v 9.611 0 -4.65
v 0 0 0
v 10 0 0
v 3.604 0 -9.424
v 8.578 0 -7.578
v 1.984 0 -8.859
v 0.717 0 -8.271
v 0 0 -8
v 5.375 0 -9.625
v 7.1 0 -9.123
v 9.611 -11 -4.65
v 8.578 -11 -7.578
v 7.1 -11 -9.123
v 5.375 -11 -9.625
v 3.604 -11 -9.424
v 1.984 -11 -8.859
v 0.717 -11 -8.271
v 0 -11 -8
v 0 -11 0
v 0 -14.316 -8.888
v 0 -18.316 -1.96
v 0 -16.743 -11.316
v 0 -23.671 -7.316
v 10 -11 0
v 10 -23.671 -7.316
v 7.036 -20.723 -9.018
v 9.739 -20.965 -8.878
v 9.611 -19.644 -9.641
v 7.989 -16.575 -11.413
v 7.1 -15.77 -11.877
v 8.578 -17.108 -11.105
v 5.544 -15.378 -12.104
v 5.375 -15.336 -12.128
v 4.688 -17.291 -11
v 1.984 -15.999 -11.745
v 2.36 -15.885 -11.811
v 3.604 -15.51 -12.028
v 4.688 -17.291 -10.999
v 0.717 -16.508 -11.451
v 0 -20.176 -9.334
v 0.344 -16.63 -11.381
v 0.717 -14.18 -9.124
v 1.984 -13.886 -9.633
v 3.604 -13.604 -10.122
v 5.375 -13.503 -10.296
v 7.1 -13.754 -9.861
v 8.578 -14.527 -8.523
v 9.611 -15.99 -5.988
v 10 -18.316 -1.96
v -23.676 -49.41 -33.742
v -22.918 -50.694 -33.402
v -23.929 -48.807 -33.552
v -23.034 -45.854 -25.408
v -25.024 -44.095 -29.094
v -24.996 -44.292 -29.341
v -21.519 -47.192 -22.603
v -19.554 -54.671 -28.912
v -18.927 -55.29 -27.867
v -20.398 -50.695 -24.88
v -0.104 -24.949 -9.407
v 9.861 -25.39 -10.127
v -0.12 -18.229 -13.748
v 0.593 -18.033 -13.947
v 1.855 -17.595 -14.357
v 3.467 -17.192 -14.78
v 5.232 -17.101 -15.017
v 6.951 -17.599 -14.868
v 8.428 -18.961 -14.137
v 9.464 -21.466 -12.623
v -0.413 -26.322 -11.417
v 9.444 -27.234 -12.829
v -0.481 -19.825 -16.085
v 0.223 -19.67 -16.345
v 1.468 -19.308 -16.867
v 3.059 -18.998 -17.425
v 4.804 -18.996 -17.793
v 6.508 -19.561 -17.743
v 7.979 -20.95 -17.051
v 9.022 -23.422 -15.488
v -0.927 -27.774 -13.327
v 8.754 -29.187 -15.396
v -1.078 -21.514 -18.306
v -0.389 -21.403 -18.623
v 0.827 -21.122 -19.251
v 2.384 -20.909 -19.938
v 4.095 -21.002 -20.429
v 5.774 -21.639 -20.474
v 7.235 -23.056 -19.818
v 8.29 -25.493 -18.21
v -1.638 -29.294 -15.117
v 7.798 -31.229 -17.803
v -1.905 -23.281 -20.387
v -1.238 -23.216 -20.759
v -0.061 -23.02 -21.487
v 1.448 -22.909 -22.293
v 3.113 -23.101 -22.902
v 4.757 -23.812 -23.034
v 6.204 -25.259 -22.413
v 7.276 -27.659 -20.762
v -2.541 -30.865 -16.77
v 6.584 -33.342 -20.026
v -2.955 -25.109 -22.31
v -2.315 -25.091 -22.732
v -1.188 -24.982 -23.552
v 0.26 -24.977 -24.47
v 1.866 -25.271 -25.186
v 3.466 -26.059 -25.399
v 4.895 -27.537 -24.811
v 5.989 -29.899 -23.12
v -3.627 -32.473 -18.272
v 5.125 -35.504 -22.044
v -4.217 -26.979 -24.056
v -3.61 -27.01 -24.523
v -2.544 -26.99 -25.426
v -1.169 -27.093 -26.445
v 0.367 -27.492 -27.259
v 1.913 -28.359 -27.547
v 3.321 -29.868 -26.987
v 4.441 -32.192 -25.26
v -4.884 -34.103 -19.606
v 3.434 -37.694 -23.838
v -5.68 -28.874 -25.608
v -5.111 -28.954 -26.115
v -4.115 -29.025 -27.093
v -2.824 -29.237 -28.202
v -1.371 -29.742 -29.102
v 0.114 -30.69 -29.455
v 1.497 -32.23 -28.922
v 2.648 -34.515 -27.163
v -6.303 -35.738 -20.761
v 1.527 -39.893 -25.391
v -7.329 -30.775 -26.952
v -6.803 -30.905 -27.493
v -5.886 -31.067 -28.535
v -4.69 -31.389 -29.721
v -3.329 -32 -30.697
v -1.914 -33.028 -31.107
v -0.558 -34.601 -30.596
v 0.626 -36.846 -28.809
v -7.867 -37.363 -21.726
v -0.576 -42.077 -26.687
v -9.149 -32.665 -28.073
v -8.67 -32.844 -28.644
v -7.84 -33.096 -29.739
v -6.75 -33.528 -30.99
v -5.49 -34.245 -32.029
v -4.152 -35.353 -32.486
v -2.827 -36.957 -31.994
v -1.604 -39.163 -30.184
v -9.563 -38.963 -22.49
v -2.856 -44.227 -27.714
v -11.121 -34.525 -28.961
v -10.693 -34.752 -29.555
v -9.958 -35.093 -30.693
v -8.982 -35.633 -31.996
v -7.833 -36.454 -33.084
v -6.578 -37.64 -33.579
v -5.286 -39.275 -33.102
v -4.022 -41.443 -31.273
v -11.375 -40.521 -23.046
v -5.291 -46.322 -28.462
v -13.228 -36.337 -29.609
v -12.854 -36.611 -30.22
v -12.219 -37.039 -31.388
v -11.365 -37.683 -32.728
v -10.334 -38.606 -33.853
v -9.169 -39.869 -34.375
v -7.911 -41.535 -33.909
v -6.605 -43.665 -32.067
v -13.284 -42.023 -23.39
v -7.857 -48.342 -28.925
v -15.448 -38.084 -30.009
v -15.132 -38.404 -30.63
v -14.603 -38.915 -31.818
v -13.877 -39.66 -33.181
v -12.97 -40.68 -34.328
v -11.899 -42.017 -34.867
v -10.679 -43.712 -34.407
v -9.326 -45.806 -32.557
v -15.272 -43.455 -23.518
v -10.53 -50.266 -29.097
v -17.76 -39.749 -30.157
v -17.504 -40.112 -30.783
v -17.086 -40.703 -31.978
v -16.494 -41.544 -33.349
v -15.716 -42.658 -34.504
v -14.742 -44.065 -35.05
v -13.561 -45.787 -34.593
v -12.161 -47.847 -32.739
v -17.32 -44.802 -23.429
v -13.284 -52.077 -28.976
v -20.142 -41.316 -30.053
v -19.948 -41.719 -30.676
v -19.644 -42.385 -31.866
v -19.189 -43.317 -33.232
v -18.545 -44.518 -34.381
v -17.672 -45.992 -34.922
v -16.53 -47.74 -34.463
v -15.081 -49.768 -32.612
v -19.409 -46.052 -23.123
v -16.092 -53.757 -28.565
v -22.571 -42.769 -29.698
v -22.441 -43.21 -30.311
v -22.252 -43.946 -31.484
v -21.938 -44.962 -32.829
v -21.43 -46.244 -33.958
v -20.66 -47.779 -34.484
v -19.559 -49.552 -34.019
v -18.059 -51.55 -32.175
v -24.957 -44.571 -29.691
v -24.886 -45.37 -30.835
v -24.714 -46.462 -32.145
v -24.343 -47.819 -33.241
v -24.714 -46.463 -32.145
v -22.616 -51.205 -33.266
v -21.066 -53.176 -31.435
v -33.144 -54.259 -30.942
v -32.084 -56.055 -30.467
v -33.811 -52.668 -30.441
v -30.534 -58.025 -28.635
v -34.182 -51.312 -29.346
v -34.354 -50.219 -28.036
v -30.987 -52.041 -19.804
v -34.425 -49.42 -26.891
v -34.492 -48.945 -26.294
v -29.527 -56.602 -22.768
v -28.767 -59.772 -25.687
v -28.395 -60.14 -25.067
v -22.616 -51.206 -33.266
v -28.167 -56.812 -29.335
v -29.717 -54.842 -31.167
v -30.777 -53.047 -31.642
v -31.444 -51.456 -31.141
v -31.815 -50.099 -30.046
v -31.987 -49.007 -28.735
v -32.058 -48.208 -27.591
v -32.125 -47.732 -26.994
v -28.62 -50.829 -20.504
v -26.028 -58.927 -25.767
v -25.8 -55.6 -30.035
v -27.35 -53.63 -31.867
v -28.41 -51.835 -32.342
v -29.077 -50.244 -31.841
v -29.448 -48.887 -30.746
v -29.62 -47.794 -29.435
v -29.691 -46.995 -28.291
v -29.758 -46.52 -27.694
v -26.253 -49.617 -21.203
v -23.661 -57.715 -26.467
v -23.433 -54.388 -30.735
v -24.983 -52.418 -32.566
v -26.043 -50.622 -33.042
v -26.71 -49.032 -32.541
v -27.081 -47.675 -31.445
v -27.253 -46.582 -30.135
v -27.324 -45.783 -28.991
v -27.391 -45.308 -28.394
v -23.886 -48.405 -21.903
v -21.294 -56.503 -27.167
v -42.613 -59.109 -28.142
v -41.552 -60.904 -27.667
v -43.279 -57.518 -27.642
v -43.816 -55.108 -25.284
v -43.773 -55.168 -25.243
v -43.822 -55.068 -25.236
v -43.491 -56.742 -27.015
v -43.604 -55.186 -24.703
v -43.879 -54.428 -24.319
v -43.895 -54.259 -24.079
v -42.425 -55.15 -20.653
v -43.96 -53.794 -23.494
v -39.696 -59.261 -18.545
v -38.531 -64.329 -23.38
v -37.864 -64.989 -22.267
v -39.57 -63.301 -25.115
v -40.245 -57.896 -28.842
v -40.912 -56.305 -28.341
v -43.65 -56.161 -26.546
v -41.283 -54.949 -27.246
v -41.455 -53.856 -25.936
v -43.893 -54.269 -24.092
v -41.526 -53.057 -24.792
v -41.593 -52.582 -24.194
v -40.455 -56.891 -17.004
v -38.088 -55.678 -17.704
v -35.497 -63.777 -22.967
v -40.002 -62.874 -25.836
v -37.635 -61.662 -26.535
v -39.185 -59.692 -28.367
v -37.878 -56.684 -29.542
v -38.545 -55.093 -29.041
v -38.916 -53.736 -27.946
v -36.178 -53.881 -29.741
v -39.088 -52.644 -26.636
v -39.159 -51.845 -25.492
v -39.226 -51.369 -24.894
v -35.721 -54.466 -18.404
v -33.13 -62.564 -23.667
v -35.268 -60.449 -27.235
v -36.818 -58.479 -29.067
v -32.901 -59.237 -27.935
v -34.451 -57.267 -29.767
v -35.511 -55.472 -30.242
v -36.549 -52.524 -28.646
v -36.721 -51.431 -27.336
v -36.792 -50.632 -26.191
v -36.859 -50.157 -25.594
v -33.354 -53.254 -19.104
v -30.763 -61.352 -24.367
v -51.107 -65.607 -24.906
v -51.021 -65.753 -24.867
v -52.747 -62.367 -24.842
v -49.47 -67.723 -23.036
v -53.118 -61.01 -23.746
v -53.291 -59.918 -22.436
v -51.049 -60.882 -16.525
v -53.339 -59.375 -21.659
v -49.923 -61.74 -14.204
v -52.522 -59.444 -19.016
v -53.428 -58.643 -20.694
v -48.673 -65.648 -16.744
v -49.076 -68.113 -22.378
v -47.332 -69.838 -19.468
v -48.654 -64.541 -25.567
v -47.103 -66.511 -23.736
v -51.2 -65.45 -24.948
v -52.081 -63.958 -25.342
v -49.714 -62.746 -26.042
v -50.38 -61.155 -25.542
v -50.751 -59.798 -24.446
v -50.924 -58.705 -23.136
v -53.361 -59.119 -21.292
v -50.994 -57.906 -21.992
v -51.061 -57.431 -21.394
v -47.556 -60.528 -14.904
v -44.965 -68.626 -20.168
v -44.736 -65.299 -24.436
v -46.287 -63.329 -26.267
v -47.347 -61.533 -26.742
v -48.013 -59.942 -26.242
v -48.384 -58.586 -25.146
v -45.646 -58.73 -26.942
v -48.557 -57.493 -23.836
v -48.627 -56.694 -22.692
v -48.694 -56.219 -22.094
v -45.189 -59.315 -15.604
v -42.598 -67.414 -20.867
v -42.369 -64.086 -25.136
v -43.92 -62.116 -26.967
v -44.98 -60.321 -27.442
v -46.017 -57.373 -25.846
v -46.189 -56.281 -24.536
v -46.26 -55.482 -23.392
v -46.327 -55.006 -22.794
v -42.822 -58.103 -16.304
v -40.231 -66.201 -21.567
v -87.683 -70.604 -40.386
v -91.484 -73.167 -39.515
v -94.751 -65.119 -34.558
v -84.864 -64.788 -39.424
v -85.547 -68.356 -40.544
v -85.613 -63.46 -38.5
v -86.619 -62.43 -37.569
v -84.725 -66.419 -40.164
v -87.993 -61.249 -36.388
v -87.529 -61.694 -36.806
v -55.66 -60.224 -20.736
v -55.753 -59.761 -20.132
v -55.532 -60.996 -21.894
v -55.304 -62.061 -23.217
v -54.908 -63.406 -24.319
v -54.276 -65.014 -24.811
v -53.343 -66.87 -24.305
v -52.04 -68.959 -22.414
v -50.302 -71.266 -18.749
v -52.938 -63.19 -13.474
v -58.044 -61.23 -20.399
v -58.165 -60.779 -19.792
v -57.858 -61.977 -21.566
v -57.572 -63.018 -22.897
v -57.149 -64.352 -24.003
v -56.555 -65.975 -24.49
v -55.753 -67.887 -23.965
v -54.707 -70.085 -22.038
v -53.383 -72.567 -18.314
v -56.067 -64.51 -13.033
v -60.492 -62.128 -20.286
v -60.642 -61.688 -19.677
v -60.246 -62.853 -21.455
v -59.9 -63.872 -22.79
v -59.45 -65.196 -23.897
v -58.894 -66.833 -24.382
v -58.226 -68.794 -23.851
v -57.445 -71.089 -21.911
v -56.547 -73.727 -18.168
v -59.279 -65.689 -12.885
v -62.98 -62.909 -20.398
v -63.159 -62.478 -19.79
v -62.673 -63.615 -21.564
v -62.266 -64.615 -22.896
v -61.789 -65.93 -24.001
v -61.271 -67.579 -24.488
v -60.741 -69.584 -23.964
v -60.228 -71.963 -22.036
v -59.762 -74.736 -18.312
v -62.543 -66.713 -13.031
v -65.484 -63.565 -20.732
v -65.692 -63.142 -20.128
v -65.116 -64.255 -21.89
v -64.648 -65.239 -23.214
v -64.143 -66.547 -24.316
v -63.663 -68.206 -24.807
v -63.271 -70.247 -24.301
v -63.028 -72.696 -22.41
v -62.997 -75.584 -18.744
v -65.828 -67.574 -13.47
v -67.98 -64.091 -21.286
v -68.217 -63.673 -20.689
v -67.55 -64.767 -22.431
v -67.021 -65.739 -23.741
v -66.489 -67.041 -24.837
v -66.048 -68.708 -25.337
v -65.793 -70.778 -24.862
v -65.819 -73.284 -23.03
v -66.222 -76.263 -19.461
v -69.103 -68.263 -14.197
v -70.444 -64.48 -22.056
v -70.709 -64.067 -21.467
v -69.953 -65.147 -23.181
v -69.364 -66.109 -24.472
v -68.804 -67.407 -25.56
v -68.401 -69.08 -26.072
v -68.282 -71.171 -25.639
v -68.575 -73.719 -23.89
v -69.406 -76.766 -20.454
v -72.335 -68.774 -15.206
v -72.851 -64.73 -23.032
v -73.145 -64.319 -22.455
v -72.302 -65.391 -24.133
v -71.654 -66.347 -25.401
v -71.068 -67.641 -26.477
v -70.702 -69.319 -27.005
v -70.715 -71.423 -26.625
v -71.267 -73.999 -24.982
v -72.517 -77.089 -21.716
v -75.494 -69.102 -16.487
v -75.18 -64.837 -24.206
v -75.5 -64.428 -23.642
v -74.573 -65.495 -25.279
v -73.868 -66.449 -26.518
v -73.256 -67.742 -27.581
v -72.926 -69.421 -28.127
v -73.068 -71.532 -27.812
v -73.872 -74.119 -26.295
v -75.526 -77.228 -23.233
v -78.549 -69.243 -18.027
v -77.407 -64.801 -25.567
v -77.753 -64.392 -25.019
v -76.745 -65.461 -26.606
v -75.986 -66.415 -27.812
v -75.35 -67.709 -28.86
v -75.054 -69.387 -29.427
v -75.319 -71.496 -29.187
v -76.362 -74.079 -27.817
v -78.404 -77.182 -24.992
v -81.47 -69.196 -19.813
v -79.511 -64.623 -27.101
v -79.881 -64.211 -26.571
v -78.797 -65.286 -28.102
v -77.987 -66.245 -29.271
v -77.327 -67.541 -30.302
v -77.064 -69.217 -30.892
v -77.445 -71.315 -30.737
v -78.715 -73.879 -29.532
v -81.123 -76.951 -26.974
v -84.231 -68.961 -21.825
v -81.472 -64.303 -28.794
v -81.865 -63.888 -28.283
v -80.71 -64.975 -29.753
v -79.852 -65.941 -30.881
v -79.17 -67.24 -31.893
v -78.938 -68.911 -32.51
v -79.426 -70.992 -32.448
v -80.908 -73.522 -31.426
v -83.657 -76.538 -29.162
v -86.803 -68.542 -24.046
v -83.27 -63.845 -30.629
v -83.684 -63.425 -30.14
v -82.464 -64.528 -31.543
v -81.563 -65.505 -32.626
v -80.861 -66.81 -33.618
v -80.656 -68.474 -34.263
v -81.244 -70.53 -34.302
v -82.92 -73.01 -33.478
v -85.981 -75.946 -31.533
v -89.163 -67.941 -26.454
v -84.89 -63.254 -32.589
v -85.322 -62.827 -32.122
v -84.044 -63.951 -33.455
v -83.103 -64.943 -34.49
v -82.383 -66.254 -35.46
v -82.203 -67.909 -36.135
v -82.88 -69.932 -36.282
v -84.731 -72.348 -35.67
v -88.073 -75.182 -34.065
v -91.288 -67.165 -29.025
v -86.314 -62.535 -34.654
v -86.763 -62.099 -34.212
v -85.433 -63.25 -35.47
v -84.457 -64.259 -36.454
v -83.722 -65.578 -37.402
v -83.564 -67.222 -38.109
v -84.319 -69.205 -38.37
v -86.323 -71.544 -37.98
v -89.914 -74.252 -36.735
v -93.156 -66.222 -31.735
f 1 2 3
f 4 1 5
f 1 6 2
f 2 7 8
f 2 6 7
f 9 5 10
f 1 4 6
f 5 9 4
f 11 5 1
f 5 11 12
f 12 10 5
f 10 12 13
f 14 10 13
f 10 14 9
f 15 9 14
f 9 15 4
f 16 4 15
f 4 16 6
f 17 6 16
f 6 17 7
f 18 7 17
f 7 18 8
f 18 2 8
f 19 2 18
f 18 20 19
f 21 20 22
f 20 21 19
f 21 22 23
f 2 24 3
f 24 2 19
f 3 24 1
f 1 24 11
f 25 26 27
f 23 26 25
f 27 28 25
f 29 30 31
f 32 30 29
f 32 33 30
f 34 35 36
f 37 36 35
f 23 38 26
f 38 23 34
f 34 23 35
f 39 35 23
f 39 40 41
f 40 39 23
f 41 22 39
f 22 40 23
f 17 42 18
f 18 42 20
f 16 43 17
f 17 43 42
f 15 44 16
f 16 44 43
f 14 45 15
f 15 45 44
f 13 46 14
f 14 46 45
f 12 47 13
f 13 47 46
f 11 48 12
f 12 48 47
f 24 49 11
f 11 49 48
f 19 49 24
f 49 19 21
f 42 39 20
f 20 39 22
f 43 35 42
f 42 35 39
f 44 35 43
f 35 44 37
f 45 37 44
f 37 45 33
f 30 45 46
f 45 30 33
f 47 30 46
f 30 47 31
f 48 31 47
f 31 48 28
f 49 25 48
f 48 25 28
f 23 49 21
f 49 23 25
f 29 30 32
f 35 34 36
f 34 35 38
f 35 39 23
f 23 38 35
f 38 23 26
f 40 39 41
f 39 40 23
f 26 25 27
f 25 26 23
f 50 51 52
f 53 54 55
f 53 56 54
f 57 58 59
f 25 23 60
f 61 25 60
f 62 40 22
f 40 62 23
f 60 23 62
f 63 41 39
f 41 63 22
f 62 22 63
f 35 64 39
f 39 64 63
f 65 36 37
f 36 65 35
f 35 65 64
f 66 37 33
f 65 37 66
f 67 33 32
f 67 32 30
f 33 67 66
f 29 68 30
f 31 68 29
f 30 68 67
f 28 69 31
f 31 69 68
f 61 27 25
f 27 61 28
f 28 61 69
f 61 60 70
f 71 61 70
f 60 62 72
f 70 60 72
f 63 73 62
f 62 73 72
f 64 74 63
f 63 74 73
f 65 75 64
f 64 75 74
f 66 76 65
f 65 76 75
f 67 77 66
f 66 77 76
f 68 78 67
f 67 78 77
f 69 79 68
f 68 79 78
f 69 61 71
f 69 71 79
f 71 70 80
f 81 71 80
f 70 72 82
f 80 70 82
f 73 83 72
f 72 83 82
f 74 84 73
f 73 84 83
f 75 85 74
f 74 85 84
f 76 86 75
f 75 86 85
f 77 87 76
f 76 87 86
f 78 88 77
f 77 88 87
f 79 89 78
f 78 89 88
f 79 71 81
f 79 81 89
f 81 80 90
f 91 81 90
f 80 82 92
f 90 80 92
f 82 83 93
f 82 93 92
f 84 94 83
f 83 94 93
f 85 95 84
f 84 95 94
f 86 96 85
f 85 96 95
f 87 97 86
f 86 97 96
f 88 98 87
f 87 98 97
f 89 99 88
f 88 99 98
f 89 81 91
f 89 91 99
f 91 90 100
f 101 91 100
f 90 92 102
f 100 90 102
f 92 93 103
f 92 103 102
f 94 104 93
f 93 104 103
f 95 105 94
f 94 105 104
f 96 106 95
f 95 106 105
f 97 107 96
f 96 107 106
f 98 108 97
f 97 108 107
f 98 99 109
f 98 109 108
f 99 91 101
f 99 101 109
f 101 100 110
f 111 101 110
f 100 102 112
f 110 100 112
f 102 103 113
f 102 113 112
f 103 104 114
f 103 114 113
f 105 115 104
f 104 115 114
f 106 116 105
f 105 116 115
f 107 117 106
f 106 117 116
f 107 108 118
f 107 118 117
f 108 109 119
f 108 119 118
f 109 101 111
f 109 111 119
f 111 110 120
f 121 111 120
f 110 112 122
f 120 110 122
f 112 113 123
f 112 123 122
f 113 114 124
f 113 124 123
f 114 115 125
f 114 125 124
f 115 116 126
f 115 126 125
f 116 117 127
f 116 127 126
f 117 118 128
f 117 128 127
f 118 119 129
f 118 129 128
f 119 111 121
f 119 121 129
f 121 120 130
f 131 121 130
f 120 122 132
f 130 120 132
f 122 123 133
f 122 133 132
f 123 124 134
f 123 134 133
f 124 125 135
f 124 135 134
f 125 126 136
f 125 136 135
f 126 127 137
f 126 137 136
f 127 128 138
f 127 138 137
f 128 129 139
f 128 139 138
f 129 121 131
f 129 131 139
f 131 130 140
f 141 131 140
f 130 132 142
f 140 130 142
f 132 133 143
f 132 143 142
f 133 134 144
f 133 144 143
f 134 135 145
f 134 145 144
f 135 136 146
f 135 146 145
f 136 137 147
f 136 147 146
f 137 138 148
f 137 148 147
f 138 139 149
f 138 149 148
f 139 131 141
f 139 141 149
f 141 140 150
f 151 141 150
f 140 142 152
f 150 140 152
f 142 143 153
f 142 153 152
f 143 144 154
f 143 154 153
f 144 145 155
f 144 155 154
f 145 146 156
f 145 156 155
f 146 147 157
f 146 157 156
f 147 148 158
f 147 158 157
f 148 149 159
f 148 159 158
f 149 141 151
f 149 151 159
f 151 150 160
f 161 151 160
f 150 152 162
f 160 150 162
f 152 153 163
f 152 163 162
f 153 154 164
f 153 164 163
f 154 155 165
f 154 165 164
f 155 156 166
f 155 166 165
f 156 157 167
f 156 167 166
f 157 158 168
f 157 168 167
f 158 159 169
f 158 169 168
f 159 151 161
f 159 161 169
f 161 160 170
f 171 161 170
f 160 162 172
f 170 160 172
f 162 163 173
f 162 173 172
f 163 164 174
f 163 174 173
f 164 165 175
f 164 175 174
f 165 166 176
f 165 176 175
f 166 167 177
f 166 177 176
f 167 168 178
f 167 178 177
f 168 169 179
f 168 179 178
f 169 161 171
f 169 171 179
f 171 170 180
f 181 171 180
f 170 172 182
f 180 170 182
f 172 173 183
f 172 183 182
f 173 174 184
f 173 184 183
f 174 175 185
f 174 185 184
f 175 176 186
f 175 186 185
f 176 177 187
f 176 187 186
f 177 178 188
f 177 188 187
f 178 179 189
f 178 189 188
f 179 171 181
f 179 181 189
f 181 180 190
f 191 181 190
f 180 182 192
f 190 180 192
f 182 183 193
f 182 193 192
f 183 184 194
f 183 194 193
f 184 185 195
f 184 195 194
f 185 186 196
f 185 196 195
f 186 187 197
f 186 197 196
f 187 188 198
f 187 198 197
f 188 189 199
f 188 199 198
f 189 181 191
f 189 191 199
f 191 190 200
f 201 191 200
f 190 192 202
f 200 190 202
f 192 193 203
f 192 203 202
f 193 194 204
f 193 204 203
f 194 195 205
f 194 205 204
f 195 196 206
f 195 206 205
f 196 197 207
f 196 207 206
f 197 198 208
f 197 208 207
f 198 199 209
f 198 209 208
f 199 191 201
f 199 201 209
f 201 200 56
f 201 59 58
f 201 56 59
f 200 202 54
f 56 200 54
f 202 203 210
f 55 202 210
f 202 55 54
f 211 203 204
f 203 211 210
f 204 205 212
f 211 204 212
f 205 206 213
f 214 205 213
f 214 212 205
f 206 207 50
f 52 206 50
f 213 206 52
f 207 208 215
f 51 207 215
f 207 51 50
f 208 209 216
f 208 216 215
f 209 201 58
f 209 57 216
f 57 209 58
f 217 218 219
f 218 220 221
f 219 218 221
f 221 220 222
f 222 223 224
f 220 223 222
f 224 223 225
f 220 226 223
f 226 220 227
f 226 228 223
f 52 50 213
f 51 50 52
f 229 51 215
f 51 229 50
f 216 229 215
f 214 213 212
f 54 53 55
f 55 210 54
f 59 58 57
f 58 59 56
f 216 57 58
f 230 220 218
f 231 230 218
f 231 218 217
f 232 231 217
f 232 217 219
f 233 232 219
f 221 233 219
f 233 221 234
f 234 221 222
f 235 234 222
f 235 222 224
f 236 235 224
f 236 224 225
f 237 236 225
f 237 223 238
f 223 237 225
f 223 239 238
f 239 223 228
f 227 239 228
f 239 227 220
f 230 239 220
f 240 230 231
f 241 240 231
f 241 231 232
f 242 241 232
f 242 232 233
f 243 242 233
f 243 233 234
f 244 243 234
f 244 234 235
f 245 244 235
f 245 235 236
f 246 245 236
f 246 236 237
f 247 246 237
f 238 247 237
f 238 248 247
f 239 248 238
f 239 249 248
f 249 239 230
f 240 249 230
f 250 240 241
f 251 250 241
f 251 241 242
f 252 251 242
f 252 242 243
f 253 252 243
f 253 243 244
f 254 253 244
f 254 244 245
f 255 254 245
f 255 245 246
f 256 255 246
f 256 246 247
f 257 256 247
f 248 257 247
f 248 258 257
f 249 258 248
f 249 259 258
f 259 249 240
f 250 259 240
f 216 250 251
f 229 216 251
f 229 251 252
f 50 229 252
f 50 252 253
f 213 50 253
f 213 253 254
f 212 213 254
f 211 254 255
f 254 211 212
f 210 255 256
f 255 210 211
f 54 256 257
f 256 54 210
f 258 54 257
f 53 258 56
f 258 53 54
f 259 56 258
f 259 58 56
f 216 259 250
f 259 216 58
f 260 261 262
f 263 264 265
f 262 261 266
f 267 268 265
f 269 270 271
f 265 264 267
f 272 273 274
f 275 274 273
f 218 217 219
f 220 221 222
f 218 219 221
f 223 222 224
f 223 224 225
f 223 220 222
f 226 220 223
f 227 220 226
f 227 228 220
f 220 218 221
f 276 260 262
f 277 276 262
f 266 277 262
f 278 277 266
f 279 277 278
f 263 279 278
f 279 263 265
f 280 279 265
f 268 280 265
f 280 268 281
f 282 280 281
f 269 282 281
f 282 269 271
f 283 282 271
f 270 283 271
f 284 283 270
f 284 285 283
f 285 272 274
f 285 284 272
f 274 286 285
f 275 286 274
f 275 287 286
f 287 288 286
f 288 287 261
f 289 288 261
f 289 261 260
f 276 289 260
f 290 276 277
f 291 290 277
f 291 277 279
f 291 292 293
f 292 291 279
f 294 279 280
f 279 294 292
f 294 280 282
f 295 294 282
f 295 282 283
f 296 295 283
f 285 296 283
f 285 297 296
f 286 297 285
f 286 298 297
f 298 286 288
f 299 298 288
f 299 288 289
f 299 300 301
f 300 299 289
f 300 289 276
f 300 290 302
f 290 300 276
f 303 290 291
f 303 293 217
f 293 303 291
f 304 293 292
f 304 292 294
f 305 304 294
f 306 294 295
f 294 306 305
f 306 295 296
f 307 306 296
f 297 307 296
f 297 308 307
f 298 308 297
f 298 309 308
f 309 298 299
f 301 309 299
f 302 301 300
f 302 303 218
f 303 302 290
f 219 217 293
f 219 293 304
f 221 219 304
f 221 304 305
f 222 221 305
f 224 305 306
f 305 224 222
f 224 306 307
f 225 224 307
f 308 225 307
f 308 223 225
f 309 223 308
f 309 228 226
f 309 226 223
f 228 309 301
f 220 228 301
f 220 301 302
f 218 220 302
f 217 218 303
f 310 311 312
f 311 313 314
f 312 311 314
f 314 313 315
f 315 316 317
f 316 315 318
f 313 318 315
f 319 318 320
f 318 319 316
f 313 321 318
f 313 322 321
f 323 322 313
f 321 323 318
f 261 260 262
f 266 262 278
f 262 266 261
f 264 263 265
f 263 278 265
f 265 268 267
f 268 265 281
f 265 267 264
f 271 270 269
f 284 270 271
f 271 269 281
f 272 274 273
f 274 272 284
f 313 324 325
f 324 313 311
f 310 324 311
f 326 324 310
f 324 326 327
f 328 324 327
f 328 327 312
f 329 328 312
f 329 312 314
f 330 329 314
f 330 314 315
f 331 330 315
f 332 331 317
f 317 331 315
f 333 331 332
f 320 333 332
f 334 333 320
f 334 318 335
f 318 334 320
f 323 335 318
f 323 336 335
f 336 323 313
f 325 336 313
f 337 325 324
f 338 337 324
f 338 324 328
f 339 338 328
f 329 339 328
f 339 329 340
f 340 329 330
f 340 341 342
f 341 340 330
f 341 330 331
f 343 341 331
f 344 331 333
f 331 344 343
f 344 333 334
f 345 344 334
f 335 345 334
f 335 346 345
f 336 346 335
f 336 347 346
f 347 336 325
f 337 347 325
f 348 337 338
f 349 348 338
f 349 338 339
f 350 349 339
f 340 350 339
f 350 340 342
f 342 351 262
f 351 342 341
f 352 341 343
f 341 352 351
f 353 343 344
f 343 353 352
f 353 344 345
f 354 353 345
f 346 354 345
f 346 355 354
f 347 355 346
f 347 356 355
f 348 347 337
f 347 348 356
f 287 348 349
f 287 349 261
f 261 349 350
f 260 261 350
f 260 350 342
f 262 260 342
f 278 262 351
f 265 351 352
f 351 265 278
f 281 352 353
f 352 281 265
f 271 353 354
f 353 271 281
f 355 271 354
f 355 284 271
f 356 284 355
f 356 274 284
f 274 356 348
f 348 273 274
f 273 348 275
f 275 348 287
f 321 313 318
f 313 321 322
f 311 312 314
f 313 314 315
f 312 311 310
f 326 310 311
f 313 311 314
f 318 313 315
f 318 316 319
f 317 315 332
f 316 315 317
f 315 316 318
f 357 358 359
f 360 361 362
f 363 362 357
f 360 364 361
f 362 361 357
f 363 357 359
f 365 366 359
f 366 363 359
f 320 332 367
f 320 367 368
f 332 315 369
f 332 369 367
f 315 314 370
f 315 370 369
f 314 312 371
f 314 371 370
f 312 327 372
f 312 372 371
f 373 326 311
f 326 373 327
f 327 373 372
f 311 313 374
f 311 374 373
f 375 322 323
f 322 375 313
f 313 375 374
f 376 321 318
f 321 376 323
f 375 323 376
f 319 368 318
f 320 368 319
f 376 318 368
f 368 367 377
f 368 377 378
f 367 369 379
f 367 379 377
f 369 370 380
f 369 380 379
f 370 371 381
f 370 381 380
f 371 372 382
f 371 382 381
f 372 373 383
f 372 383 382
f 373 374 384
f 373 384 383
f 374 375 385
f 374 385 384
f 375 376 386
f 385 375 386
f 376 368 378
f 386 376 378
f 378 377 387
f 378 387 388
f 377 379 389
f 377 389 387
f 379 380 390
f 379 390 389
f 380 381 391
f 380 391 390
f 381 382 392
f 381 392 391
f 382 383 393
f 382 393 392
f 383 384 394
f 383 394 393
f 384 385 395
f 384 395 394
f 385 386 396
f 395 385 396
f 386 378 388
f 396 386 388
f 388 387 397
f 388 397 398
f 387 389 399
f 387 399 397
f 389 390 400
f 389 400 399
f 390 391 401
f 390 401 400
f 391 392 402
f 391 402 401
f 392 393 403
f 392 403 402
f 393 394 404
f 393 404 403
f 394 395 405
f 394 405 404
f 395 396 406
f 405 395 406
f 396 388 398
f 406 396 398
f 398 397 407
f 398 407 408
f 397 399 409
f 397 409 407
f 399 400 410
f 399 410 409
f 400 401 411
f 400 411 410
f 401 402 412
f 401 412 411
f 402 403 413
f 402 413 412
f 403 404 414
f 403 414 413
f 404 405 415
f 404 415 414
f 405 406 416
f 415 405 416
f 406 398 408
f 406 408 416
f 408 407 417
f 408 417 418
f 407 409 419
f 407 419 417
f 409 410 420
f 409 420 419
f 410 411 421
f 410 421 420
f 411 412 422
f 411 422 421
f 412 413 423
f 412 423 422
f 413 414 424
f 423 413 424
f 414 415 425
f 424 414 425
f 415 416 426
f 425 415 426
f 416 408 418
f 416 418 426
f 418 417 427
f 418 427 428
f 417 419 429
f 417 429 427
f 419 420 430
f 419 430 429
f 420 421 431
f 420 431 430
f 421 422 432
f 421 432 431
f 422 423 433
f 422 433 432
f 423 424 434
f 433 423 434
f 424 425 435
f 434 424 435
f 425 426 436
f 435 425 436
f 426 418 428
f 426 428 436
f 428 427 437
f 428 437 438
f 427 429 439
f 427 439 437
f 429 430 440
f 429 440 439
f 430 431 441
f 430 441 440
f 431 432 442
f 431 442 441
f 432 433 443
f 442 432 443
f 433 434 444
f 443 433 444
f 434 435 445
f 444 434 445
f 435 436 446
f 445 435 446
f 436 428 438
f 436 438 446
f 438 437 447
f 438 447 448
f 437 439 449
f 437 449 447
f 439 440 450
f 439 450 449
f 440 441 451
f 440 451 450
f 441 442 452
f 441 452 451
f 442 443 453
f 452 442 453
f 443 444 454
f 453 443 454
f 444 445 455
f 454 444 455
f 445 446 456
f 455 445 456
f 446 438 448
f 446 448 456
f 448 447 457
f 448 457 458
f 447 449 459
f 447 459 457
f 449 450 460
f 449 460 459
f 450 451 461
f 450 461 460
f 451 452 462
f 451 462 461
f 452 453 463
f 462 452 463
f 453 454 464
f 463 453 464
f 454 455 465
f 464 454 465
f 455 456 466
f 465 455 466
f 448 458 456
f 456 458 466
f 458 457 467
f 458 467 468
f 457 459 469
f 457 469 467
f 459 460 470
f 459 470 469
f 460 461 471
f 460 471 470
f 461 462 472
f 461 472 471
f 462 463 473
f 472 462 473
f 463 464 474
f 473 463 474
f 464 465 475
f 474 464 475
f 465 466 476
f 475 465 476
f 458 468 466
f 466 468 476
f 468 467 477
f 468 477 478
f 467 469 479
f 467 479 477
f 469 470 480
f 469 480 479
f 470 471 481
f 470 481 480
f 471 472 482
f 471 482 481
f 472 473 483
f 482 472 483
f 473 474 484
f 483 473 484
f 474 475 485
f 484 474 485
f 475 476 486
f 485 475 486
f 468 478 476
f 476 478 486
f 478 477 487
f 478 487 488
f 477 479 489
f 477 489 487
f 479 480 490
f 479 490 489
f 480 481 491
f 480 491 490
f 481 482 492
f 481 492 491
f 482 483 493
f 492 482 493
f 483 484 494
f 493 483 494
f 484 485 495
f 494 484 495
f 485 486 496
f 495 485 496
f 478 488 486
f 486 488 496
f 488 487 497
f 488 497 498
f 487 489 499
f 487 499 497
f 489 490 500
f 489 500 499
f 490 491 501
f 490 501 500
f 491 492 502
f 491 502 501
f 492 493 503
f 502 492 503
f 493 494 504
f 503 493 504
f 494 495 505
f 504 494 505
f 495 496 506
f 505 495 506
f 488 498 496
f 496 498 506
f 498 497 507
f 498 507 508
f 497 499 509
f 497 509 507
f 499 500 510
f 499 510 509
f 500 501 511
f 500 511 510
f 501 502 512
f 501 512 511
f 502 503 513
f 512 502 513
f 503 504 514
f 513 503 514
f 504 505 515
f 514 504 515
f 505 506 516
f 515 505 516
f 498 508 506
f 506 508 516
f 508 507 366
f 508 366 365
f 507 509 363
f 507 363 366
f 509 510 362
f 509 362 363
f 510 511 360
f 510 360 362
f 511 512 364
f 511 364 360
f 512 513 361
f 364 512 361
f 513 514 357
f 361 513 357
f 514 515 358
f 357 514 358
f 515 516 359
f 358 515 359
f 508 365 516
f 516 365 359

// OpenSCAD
// Start: lazy_union
default_5_default_5();
// End: lazy_union

// Modules.

// 'PartMaterial undef-default - default 5.0'
module default_5_default_5() {
  // 'None : _combine_solids_and_holes'
  union() {
    // 'default : _combine_solids_and_holes'
    union() {
      // ('item', 0)
      multmatrix(m=[[1.0, 0.0, 0.0, 5.0], [0.0, 0.0, 1.0, -11.0], [-0.0, -1.0, -0.0, -0.0], [0.0, 0.0, 0.0, 1.0]]) {
        // "('item', 0) : _combine_solids_and_holes"
        union() {
          // ('item', 0)
          linear_extrude(height=11.0, twist=0.0, slices=4, scale=[1.0, 1.0], $fn=16) {
            polygon(points=[[-5.0, 0.0], [5.0, 0.0], [4.611328125, 4.650390625], [3.578125, 7.578125], [2.099609375, 9.123046875], [0.375, 9.625], [-1.396484375, 9.423828125], [-3.015625, 8.859375], [-4.283203125, 8.271484375], [-5.0, 8.0]]);
          }
        }
      }
      // ('item', 1)
      multmatrix(m=[[0.0, 0.0, 1.0, 5.0], [0.0, -1.0, 0.0, -11.0], [1.0, 0.0, 0.0, -14.63139120095125], [0.0, 0.0, 0.0, 1.0]]) {
        // "('item', 1) : _combine_solids_and_holes"
        union() {
          // ('item', 1)
          rotate_extrude(angle=60.0, convexity=10, $fn=16) {
            polygon(points=[[14.63139120095125, -5.0], [14.63139120095125, 5.0], [9.98100057595125, 4.611328125], [7.053266200951249, 3.578125], [5.508344325951249, 2.099609375], [5.006391200951249, 0.375], [5.207563075951249, -1.396484375], [5.772016200951249, -3.015625], [6.359906825951249, -4.283203125], [6.631391200951249, -5.0]]);
          }
        }
      }
      // ('item', 2)
      multmatrix(m=[[0.8607422163029769, 0.0, -0.5090410956630509, -22.616146743020717], [0.4408425204144667, -0.5000000000000001, 0.7454246254280982, -33.08493940871671], [-0.2545205478315255, -0.8660254037844386, -0.43037110815148855, -1.8806454882920782], [0.0, 0.0, 0.0, 1.0]]) {
        // "('item', 2) : _combine_solids_and_holes"
        union() {
          // ('item', 2)
          rotate_extrude(angle=90.0, convexity=10, $fn=64) {
            polygon(points=[[25.0, -2.156193959186389], [33.60742216302977, -7.2466049158168975], [35.640115810938816, -3.045967425476399], [36.24113137729553, 0.0], [35.75493928535826, 2.0824046924073905], [34.526009958385366, 3.3923539835408647], [32.89881381963518, 4.120955205195516], [31.217821292366057, 4.459315689166429], [29.827502799836342, 4.598542767248707], [29.072328765304395, 4.729743771237425]]);
          }
        }
      }
      // ('item', 3)
      multmatrix(m=[[0.2591228370738393, -0.4381531608703101, 0.8607422163029769, -29.691105601537974], [-0.8098228762136269, 0.38709789634627206, 0.4408425204144667, -56.09060158872082], [-0.5263480449929431, -0.8112811018775471, -0.2545205478315255, -22.435331198116387], [0.0, 0.0, 0.0, 1.0]]) {
        // "('item', 3) : _combine_solids_and_holes"
        union() {
          // ('item', 3)
          linear_extrude(height=11.0, twist=0.0, slices=4, scale=[1.0, 1.0], $fn=16) {
            polygon(points=[[-5.0, 0.0], [5.0, 0.0], [4.611328125, 4.650390625], [3.578125, 7.578125], [2.099609375, 9.123046875], [0.375, 9.625], [-1.396484375, 9.423828125], [-3.015625, 8.859375], [-4.283203125, 8.271484375], [-5.0, 8.0]]);
          }
        }
      }
      // ('item', 4)
      multmatrix(m=[[-0.5090410956630508, 3.168889557509341e-17, 0.8607422163029769, -41.5524755016862], [0.7454246254280981, 0.5, 0.4408425204144667, -60.90404054648275], [-0.4303711081514884, 0.8660254037844385, -0.2545205478315255, -27.666933870625765], [0.0, 0.0, 0.0, 1.0]]) {
        // "('item', 4) : _combine_solids_and_holes"
        union() {
          // ('item', 4)
          linear_extrude(height=11.0, twist=0.0, slices=4, scale=[1.0, 1.0], $fn=16) {
            polygon(points=[[-2.156193959186389, 11.241131377295531], [-7.2466049158168975, 2.633709214265762], [-3.045967425476399, 0.6010155663567156], [0.0, 0.0], [2.0824046924073905, 0.48619209193726665], [3.3923539835408647, 1.7151214189101651], [4.120955205195516, 3.3423175576603477], [4.459315689166429, 5.023310084929472], [4.598542767248707, 6.413628577459177], [4.729743771237425, 7.1688026119911274]]);
          }
        }
      }
      // ('item', 5)
      multmatrix(m=[[0.2591228370738393, -0.43815316087031003, 0.8607422163029769, -47.979627267518865], [-0.8098228762136269, 0.38709789634627206, 0.4408425204144667, -67.81369422837315], [-0.5263480449929431, -0.811281101877547, -0.2545205478315255, -18.151749258305184], [0.0, 0.0, 0.0, 1.0]]) {
        // "('item', 5) : _combine_solids_and_holes"
        union() {
          // ('item', 5)
          linear_extrude(height=11.0, twist=0.0, slices=4, scale=[1.0, 1.0], $fn=16) {
            polygon(points=[[-7.5, 0.0], [2.5, 0.0], [2.111328125, 4.650390625], [1.078125, 7.578125], [-0.400390625, 9.123046875], [-2.125, 9.625], [-3.896484375, 9.423828125], [-5.515625, 8.859375], [-6.783203125, 8.271484375], [-7.5, 8.0]]);
          }
        }
      }
      // ('item', 6)
      multmatrix(m=[[0.4239283644714259, -0.8607422163029769, 0.28179350395355307, -63.34569658146316], [-0.34399951557858643, -0.4408425204144667, -0.8290489765244984, -53.76701547462166], [0.8378240119967197, 0.2545205478315255, -0.482980554115029, -45.787440568184564], [0.0, 0.0, 0.0, 1.0]]) {
        // "('item', 6) : _combine_solids_and_holes"
        union() {
          // ('item', 6)
          rotate_extrude(angle=90.0, convexity=10, $fn=64) {
            polygon(points=[[34.89420033536026, -4.861692063855639], [34.36861200413263, 5.124486229469458], [29.74507715286451, 4.491932460519322], [26.87569335706863, 3.306279096128852], [25.41061588377159, 1.7486077410413206], [25.0, 0.0], [25.294000972780463, -1.758462522251838], [25.942774069139567, -3.3456982209709256], [26.596474556103946, -4.580625491413986], [26.905257700700183, -5.282162728837749]]);
          }
        }
      }
    }
  }
} // end module default_5_default_5
